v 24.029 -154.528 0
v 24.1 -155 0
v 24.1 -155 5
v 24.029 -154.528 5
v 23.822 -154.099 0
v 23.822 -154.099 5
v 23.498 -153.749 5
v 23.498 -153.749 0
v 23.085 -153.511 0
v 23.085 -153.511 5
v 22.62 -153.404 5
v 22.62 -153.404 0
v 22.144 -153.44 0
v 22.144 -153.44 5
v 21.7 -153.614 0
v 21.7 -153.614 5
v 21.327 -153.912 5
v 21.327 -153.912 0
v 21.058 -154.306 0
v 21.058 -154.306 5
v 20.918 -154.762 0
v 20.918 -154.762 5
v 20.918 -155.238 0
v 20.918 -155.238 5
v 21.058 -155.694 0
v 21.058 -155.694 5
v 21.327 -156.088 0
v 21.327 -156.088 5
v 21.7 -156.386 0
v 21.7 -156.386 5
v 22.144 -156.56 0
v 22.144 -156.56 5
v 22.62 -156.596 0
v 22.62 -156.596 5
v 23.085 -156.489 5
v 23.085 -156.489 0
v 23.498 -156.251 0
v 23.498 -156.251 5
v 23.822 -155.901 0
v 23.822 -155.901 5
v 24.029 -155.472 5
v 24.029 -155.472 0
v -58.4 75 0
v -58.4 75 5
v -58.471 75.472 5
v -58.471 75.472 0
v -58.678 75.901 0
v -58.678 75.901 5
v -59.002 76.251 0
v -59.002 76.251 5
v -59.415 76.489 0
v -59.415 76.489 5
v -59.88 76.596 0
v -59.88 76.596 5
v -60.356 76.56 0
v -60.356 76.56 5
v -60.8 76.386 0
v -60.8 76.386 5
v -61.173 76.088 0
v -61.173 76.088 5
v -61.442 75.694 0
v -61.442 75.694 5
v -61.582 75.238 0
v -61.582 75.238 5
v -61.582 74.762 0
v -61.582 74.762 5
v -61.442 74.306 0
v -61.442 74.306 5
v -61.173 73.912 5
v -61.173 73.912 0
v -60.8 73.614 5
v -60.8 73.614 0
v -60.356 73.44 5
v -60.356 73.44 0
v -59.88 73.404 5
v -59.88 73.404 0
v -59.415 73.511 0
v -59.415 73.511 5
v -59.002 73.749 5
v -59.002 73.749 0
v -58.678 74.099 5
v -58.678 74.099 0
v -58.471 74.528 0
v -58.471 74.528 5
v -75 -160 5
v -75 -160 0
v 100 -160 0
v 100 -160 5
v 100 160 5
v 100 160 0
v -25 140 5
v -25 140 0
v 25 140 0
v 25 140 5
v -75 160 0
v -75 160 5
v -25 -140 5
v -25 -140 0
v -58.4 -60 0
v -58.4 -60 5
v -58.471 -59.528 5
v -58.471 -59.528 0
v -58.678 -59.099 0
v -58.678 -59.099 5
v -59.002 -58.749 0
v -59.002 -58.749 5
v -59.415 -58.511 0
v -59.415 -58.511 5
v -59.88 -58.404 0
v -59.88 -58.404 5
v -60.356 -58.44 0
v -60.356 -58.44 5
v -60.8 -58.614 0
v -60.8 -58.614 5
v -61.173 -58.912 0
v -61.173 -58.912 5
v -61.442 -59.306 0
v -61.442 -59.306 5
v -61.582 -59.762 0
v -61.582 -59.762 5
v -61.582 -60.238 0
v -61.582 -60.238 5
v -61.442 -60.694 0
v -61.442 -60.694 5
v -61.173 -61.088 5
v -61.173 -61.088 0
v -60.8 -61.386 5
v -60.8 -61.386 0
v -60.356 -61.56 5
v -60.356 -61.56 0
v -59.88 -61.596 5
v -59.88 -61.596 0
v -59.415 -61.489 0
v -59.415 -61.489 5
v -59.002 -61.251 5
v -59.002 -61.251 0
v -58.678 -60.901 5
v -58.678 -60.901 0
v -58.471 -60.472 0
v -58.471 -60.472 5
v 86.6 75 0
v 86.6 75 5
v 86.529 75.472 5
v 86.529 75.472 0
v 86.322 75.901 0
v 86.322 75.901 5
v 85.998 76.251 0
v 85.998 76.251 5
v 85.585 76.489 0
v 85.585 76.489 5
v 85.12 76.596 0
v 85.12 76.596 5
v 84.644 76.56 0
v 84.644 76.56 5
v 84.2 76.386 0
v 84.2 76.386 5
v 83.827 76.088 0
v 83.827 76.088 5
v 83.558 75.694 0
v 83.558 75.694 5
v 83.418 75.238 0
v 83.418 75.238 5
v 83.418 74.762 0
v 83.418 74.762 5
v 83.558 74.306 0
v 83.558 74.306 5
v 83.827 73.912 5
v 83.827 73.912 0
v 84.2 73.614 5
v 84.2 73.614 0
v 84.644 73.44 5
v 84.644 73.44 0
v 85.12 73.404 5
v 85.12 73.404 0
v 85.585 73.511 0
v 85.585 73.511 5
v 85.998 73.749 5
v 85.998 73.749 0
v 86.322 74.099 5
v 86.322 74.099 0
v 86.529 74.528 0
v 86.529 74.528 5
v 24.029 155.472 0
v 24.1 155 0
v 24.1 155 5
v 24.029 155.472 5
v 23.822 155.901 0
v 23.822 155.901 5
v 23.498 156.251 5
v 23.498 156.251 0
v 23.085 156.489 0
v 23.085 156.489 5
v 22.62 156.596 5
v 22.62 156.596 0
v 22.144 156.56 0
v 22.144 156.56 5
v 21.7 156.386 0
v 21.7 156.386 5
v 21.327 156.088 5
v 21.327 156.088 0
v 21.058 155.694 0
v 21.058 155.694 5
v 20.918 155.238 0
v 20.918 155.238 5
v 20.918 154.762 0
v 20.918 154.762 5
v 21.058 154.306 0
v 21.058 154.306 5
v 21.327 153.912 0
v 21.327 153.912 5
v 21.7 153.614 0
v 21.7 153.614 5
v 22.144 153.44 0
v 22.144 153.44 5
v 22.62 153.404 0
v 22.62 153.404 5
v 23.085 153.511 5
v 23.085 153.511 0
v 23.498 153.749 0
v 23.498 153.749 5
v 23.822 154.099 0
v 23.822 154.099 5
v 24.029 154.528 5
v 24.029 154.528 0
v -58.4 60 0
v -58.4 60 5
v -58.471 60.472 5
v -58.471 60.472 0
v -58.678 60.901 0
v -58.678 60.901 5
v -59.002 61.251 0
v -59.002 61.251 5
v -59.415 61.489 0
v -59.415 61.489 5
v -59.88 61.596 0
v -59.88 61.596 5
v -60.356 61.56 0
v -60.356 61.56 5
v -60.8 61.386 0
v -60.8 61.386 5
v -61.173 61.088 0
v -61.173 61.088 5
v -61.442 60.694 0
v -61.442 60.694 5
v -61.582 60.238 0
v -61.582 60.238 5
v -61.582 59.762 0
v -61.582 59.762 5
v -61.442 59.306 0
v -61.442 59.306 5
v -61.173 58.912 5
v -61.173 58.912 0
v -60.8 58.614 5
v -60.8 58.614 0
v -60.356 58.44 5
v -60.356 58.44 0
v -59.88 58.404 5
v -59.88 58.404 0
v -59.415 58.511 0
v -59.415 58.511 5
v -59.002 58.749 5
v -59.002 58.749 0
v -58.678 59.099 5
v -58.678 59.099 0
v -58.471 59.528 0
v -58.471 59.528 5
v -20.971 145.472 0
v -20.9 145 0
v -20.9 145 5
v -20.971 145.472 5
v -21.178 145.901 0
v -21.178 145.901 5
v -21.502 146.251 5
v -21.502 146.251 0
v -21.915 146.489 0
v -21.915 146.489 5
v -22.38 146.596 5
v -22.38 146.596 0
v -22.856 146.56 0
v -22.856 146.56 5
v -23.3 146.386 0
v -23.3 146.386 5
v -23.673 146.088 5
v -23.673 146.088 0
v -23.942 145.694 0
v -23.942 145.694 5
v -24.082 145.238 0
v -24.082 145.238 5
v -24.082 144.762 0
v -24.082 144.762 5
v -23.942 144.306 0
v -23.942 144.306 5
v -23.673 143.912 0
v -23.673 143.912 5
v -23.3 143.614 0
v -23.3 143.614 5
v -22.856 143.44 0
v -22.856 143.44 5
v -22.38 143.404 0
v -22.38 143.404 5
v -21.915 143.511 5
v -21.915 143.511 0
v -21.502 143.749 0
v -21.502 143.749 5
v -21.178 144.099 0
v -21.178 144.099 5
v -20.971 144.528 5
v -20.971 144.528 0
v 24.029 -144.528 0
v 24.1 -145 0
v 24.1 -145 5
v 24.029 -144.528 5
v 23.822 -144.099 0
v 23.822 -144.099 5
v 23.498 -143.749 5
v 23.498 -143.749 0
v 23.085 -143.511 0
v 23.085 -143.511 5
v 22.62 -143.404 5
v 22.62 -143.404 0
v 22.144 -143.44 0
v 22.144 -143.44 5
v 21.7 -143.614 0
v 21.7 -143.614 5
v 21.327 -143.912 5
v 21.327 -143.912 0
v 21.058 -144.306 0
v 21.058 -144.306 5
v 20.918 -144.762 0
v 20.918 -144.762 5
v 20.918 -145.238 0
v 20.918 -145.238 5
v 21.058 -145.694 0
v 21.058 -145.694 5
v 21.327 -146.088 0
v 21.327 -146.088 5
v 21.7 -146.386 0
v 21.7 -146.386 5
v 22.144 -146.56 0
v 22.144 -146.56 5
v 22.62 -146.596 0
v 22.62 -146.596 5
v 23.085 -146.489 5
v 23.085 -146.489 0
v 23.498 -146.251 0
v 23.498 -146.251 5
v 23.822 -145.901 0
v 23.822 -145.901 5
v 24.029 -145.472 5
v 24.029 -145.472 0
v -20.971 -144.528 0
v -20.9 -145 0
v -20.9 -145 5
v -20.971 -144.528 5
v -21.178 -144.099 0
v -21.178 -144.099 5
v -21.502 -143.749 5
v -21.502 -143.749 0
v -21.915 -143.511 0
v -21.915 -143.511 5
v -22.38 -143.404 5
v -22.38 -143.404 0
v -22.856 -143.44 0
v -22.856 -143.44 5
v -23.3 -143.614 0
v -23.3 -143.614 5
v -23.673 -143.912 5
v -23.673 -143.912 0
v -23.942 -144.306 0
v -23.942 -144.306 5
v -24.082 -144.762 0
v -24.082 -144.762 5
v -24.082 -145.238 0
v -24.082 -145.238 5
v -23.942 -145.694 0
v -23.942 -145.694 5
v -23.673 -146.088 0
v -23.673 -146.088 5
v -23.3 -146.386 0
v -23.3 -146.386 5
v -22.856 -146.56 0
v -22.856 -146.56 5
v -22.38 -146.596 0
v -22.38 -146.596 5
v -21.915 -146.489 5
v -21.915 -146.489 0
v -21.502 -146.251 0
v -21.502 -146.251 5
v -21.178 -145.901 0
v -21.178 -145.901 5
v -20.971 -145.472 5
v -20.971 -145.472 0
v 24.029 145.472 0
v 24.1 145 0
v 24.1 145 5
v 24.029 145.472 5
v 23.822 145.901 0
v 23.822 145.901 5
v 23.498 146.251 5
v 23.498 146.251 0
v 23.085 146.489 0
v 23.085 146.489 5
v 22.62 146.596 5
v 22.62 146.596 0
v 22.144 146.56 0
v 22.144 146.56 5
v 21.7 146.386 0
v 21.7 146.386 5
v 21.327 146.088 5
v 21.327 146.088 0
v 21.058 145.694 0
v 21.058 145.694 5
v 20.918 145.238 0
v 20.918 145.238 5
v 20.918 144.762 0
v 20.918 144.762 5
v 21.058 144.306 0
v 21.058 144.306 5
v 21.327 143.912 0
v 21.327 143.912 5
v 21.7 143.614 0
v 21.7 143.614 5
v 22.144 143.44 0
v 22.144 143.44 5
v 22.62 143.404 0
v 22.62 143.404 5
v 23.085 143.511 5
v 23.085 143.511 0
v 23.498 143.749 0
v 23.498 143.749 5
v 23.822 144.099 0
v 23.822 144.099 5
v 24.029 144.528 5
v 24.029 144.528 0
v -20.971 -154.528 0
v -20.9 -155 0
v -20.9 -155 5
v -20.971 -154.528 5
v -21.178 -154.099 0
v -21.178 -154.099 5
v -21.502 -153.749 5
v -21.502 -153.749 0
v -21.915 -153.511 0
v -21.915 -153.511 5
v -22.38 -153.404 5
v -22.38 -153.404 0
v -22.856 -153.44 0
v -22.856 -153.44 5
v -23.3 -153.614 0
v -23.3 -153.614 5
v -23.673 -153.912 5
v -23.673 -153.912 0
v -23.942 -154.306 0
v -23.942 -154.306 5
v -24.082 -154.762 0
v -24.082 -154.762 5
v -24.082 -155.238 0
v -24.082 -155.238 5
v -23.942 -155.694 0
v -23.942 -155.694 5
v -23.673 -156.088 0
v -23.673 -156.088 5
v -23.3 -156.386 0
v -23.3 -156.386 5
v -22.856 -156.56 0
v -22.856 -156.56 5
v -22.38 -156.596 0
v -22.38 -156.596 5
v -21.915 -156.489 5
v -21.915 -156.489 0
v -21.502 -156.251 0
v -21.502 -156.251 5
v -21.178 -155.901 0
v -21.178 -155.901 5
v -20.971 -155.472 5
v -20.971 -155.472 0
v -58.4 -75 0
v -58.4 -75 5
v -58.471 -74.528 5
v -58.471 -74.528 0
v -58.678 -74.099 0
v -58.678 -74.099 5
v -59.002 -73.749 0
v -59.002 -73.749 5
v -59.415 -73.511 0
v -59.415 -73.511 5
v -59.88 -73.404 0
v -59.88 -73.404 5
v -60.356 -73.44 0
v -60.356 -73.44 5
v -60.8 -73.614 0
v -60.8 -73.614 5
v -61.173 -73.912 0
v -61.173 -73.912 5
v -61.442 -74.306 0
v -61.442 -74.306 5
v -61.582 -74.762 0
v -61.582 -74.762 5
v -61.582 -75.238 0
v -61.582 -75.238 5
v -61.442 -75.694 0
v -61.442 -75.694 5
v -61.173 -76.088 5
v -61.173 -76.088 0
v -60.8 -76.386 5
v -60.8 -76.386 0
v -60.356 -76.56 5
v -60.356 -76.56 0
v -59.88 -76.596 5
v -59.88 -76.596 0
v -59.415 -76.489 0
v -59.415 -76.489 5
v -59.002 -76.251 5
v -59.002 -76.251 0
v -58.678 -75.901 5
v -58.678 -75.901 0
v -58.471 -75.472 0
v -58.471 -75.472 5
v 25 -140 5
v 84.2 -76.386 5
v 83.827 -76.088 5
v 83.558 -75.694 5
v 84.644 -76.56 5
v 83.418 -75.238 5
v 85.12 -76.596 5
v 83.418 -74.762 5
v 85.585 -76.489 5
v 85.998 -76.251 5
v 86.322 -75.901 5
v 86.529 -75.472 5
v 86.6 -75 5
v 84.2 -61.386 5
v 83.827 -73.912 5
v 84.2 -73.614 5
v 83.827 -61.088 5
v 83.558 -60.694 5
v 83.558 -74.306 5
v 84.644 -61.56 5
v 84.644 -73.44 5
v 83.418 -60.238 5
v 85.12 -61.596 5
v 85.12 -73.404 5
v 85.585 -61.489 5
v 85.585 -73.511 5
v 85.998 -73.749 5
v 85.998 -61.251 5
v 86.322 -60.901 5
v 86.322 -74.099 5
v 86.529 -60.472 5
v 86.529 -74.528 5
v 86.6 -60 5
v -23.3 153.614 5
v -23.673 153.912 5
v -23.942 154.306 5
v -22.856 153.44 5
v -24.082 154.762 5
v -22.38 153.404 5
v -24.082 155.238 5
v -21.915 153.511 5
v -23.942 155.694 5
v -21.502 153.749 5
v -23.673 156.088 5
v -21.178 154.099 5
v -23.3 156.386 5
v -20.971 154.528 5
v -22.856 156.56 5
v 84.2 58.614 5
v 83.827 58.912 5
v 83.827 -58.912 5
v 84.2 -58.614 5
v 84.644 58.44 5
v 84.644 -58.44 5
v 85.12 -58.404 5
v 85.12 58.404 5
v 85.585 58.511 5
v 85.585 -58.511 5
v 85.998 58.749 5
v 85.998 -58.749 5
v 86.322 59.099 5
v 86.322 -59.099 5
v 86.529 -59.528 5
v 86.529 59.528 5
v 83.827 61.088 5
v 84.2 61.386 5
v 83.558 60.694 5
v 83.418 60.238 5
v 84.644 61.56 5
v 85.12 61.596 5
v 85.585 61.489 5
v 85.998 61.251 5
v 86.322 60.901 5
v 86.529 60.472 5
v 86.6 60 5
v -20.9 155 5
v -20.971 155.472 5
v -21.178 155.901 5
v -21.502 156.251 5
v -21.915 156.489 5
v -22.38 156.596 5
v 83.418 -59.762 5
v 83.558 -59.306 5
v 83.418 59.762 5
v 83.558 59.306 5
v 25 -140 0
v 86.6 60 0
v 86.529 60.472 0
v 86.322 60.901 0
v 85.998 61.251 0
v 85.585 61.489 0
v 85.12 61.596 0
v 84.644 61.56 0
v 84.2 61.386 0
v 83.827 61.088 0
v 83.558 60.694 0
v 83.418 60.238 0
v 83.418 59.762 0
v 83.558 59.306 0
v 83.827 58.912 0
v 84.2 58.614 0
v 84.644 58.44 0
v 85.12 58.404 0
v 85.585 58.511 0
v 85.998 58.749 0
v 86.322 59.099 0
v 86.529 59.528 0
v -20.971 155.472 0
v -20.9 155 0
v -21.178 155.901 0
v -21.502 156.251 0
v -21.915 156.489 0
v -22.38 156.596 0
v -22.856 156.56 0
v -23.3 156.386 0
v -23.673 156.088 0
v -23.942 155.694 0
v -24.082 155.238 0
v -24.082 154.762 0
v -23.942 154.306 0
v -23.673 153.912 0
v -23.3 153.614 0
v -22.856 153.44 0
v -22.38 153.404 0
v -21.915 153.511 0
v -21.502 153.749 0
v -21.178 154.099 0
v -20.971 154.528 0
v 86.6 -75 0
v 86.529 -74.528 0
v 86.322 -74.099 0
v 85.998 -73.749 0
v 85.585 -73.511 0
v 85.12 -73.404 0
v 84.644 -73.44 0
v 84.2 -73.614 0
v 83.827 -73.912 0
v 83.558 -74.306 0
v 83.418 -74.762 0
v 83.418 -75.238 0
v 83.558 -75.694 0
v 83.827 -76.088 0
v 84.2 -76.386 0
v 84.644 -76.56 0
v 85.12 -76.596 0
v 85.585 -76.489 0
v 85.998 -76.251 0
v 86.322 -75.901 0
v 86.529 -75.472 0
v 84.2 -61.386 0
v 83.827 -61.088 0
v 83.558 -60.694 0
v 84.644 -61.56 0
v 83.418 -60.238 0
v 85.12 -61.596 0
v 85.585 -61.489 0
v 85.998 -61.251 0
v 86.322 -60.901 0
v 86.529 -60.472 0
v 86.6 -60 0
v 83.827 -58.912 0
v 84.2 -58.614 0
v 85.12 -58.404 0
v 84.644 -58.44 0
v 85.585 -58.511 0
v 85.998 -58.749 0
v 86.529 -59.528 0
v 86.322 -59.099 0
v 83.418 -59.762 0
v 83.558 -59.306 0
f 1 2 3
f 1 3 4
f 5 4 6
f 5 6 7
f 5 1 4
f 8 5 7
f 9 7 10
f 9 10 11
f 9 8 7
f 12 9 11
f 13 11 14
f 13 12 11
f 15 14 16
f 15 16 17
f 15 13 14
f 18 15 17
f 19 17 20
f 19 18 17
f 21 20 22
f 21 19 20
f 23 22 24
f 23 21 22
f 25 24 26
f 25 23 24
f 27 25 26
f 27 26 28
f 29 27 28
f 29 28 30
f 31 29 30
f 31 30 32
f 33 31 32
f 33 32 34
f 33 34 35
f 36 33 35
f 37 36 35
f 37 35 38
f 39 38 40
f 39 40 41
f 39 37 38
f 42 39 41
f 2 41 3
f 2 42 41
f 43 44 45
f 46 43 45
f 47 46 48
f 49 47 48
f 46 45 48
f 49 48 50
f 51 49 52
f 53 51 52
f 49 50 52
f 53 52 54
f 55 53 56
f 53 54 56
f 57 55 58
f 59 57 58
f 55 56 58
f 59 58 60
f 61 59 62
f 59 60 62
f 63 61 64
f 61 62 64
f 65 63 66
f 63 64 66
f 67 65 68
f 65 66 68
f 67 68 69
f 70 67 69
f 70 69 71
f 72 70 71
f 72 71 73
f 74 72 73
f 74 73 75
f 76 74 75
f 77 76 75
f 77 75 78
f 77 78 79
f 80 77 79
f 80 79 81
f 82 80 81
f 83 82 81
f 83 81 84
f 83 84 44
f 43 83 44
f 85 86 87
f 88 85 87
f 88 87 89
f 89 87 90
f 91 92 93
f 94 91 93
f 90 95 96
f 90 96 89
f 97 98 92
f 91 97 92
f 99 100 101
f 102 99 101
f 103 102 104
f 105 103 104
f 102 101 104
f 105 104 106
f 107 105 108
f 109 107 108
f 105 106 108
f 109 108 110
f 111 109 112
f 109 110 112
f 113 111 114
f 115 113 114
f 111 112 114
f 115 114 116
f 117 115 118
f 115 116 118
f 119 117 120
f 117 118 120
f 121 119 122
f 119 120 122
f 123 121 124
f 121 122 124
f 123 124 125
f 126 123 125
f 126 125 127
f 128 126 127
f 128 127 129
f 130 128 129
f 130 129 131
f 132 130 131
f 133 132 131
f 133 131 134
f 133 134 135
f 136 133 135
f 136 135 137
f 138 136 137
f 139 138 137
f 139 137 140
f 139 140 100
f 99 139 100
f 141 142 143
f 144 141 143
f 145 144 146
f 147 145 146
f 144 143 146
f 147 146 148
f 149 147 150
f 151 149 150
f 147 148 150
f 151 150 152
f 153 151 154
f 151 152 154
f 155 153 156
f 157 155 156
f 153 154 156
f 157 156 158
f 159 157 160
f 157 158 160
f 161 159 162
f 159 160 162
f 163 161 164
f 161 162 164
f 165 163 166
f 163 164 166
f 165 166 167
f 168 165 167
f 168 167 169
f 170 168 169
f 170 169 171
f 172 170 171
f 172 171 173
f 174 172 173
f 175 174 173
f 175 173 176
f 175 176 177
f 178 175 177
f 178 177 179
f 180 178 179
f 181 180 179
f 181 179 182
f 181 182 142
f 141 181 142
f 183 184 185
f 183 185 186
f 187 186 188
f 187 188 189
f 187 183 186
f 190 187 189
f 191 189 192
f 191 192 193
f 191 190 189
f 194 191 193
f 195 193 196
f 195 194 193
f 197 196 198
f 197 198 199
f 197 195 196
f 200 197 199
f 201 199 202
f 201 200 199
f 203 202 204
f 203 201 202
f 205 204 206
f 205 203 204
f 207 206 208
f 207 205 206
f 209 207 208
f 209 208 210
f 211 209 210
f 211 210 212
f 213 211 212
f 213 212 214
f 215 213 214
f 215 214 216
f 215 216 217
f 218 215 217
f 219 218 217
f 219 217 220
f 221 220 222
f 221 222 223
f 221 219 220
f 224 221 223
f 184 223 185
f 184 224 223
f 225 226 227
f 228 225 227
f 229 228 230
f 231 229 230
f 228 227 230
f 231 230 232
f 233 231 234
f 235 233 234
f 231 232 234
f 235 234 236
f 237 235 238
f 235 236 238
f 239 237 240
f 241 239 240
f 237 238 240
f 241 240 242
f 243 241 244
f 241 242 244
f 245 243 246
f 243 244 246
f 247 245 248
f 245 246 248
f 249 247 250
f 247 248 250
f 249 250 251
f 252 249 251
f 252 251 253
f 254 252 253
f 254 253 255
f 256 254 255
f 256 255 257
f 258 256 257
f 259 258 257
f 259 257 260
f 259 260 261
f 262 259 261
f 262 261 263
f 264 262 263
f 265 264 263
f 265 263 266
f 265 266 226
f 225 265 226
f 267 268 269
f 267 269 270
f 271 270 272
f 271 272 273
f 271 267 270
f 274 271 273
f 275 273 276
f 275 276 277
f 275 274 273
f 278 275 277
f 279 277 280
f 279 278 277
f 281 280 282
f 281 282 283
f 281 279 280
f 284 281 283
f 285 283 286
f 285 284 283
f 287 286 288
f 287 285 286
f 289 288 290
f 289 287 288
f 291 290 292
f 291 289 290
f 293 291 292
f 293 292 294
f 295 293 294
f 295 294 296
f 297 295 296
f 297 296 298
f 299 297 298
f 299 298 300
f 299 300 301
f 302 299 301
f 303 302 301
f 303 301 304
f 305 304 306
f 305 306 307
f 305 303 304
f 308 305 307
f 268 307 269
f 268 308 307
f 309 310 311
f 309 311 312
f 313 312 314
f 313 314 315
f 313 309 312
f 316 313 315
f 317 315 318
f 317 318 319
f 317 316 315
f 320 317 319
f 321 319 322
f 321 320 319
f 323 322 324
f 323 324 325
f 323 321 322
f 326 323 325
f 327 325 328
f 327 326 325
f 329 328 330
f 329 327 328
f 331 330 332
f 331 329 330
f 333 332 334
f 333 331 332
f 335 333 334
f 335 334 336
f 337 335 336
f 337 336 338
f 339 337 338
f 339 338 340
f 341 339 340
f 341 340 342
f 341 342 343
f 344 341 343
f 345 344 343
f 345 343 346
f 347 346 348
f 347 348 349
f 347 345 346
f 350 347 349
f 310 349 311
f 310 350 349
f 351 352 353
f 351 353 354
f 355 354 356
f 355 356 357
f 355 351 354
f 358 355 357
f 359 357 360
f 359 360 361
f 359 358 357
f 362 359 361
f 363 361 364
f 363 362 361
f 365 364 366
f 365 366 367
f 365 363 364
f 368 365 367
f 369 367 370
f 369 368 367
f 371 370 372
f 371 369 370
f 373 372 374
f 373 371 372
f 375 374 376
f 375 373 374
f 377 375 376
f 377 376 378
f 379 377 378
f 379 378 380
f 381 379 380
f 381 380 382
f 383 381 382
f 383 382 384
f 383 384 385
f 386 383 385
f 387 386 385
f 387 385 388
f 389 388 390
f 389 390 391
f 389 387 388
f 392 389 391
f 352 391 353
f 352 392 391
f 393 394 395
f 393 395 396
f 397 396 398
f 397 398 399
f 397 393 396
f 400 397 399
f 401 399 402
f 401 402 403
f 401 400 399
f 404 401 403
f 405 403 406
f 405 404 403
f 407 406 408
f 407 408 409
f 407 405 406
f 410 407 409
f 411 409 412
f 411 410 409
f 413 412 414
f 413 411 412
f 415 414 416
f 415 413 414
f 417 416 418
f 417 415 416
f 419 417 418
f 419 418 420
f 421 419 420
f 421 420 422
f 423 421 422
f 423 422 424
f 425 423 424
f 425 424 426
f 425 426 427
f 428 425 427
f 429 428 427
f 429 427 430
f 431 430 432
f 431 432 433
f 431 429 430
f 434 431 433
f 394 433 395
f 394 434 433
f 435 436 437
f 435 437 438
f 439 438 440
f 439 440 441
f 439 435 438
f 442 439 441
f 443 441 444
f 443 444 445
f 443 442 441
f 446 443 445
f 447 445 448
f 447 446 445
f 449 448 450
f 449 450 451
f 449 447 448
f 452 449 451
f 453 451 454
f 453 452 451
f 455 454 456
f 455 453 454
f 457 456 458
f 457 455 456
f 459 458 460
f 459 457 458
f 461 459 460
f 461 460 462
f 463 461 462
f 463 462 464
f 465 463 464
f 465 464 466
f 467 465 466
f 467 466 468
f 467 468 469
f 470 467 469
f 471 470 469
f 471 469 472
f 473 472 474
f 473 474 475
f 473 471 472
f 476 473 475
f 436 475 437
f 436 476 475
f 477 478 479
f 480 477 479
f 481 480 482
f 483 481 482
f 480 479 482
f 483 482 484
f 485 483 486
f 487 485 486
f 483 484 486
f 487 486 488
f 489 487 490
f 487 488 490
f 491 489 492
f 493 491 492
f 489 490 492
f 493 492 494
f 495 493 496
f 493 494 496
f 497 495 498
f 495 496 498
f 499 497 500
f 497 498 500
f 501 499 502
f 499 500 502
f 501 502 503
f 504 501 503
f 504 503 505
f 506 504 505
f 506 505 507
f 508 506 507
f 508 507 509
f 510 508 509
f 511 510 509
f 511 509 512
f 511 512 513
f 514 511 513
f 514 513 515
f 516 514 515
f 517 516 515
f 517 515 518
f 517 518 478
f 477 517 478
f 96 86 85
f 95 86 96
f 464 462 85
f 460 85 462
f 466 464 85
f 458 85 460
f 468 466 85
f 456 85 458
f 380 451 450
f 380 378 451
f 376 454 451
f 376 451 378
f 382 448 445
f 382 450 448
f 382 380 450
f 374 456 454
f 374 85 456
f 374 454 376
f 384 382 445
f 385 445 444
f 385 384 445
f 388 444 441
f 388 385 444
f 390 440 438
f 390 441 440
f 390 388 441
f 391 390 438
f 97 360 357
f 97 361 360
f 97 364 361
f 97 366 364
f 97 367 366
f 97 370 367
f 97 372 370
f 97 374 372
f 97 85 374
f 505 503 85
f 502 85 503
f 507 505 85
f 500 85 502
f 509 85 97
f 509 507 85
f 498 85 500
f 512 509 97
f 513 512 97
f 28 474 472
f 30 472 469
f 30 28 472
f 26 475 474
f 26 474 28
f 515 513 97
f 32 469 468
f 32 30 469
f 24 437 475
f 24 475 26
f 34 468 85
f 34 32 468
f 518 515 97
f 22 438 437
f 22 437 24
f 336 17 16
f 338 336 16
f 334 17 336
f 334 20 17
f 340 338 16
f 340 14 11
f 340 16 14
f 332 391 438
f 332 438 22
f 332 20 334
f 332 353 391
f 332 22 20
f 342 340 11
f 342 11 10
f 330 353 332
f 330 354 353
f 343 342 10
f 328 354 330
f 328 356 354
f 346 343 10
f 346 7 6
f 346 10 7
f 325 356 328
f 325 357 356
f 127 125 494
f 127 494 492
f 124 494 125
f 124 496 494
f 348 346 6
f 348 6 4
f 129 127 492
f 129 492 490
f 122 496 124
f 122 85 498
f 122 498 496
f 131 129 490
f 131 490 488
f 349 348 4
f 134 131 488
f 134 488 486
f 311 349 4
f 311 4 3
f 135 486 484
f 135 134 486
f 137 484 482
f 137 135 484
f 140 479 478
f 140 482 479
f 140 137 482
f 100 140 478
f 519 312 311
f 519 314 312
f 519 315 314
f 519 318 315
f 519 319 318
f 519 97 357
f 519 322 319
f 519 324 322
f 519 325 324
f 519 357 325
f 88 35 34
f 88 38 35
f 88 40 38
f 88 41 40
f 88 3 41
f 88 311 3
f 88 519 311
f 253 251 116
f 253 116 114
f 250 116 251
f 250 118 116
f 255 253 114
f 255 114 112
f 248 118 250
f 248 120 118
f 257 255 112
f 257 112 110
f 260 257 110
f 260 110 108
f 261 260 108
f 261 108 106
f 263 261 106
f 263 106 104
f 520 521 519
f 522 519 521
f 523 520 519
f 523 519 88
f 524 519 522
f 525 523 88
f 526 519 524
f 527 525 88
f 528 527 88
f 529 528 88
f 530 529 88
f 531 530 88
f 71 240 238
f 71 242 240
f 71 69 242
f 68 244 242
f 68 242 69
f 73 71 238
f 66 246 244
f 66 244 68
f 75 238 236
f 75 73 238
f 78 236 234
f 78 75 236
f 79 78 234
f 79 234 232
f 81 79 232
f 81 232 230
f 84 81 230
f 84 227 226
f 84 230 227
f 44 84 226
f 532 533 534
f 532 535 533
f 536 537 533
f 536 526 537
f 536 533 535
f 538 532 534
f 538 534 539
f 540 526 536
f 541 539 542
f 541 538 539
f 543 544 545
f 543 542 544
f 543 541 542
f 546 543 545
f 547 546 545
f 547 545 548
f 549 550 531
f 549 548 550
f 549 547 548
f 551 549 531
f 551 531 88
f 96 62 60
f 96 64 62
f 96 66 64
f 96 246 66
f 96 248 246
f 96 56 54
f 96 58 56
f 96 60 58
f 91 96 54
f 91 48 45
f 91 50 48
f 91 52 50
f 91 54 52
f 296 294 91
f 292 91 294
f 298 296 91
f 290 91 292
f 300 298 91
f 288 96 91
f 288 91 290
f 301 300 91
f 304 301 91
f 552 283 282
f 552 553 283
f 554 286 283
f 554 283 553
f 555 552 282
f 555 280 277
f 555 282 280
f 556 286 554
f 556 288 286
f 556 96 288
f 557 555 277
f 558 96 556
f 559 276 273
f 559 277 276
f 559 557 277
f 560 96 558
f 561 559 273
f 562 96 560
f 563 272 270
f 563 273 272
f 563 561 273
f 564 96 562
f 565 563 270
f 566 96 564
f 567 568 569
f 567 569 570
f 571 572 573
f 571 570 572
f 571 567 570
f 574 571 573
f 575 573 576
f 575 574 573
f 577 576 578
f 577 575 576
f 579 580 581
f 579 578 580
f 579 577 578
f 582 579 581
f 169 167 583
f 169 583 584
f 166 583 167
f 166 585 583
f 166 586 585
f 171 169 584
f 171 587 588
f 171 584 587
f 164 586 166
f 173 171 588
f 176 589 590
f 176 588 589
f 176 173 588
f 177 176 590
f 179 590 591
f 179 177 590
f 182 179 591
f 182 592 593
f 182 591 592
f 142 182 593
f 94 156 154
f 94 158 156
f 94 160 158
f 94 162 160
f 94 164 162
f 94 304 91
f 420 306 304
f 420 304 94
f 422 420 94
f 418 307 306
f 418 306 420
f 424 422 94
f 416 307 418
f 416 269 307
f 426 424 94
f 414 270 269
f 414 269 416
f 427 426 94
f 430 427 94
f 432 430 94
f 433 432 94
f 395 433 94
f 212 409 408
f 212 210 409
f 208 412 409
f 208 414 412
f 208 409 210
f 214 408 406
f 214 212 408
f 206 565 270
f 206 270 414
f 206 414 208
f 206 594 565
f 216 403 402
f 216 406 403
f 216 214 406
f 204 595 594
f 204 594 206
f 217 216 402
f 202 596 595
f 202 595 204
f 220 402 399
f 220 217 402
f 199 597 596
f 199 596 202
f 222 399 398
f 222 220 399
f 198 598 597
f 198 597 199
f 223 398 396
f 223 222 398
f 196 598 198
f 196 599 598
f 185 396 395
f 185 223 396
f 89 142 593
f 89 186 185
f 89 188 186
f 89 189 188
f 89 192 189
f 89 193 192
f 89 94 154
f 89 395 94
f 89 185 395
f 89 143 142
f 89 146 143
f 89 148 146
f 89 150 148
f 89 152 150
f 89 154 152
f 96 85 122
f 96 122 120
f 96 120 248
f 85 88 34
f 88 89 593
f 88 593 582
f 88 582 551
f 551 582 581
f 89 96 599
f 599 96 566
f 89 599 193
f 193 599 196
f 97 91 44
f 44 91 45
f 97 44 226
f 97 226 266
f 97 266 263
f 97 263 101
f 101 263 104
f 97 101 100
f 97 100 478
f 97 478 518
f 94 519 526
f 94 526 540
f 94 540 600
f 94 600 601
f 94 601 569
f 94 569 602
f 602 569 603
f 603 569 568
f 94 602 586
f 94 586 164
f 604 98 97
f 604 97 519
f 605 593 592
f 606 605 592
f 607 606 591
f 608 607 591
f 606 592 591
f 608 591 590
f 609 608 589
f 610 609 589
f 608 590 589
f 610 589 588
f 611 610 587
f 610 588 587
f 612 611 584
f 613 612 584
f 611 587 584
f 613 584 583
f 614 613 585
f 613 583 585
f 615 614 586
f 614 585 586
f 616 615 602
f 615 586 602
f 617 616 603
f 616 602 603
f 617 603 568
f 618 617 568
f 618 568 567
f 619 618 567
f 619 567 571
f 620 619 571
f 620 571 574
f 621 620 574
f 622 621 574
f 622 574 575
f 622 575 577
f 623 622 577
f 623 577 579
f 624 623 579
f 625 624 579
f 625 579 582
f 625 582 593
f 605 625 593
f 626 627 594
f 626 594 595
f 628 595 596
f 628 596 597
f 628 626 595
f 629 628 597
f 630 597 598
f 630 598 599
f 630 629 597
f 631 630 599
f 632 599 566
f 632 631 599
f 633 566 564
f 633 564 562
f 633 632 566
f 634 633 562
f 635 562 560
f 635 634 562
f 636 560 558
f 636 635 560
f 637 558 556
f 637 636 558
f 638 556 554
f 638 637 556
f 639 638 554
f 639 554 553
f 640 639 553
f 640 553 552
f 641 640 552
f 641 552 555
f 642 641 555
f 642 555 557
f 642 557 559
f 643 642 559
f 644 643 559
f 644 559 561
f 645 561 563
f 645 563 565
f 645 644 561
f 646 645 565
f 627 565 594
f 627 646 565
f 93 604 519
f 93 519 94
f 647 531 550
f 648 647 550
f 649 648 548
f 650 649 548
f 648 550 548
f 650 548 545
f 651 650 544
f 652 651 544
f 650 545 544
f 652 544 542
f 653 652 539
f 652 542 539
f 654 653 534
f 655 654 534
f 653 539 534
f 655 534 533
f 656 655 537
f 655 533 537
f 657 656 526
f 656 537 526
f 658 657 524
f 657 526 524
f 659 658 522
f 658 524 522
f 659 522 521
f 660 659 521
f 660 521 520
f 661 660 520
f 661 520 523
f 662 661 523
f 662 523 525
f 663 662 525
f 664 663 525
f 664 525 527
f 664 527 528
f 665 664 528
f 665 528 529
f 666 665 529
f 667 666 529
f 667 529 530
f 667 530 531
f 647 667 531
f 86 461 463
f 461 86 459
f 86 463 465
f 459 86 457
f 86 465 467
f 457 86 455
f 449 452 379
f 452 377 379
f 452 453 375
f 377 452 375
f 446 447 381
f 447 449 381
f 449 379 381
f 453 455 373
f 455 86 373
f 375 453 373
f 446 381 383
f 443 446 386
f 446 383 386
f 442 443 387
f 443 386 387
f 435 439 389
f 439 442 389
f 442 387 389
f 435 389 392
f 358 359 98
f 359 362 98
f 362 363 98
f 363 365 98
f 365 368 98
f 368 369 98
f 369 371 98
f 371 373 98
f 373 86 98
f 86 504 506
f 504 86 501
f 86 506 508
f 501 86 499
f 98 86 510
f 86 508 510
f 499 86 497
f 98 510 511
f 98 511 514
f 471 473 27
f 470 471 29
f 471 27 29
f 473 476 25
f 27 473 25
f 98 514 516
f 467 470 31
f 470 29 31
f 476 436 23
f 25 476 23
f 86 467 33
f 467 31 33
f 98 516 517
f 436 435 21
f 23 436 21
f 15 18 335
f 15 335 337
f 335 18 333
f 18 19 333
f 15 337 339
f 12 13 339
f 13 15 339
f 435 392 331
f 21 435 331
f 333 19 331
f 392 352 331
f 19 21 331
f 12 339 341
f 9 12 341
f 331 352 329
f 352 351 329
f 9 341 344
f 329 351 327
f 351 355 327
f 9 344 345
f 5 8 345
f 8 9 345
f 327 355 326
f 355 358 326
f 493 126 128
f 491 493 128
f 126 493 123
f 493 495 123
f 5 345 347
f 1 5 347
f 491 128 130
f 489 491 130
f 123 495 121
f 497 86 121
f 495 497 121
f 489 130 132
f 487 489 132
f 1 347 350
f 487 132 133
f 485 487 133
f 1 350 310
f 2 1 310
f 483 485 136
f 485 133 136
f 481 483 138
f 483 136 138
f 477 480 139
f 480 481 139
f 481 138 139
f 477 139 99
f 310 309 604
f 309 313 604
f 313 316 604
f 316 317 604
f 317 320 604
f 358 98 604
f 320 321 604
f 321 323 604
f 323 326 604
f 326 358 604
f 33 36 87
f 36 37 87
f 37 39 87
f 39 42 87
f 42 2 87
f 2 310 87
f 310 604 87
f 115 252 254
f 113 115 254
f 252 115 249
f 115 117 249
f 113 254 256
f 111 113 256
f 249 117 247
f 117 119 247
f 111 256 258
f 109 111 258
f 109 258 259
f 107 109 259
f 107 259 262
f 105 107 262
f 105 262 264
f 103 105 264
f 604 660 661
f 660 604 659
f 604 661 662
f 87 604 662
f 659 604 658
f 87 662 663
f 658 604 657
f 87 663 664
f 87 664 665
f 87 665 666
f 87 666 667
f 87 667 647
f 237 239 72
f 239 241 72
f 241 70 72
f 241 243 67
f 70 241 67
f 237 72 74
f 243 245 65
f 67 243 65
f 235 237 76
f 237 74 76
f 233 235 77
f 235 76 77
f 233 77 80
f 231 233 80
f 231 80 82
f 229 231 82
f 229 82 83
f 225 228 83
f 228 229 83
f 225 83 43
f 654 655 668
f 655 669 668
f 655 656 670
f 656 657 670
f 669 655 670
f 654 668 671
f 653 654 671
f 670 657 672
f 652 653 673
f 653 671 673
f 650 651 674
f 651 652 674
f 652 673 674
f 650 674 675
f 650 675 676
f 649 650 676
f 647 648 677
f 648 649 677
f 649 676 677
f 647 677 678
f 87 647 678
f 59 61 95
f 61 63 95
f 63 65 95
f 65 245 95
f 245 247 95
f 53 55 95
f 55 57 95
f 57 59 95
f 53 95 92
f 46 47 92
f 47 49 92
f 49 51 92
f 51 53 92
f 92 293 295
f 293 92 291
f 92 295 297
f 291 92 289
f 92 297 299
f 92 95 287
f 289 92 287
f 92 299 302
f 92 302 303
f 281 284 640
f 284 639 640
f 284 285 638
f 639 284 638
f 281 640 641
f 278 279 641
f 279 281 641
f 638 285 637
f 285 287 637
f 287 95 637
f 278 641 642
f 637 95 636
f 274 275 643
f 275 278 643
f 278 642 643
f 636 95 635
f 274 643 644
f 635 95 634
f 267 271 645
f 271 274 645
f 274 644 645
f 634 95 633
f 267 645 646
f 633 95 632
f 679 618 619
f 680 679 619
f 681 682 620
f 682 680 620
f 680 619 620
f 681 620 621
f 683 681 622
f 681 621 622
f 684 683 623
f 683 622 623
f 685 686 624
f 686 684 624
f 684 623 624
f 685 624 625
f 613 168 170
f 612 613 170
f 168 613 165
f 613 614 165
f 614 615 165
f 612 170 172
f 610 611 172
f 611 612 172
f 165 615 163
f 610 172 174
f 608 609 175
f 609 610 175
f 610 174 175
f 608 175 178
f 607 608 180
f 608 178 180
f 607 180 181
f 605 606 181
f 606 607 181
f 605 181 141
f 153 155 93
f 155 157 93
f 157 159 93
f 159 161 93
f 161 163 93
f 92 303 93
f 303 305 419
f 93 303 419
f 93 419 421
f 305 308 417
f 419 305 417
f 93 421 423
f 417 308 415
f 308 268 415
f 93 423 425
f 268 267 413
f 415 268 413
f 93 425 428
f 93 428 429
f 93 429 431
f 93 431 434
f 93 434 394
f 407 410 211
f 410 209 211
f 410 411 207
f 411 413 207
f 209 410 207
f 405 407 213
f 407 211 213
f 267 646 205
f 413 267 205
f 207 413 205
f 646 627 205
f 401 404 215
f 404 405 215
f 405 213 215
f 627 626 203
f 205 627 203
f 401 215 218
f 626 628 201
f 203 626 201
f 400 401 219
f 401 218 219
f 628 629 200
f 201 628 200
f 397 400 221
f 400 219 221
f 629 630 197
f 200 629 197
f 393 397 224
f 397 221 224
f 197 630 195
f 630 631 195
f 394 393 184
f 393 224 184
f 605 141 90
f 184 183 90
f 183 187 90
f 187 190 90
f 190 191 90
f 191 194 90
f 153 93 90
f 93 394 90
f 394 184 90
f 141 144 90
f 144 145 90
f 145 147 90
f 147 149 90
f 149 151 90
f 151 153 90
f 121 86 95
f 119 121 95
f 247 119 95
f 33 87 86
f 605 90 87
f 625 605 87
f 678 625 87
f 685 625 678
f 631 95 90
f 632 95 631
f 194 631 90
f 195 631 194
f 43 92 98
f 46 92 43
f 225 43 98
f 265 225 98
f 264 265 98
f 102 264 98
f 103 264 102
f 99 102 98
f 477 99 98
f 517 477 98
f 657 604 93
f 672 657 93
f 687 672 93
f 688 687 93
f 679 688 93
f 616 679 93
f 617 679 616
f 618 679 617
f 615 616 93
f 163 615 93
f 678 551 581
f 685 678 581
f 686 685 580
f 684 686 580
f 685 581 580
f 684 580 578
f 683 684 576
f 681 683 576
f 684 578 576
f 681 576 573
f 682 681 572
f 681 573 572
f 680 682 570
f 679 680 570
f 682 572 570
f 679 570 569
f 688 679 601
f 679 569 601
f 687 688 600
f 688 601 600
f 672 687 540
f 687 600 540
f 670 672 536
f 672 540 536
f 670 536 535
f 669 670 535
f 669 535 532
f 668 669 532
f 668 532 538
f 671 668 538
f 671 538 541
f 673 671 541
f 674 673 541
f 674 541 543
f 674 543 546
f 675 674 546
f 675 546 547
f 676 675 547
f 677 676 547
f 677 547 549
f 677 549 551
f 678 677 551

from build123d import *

# Parameters (mm, degrees)
SKETCH1_W           = 100
SKETCH1_H           = 320
SKETCH1_R           = 1.6
SKETCH1_W_2         = 50
SKETCH1_H_2         = 280
BOSS_EXTRUDE1_DEPTH = 5
SKETCH2_W           = 50
SKETCH2_H           = 320
BOSS_EXTRUDE2_DEPTH = 5
SKETCH3_W           = 25
SKETCH3_H           = 320
BOSS_EXTRUDE3_DEPTH = 5
CUT_EXTRUDE1_REACH  = 7
SKETCH4_R           = 1.6


with BuildPart() as part:
    # Sketch1 → Boss-Extrude1 (new body)
    with BuildSketch(Plane.XY):
        Rectangle(SKETCH1_W, SKETCH1_H)
        with Locations((-22.5, 145)):
            Circle(SKETCH1_R, mode=Mode.SUBTRACT)
        with Locations((-22.5, 155)):
            Circle(SKETCH1_R, mode=Mode.SUBTRACT)
        with Locations((22.5, 145)):
            Circle(SKETCH1_R, mode=Mode.SUBTRACT)
        with Locations((22.5, -145)):
            Circle(SKETCH1_R, mode=Mode.SUBTRACT)
        with Locations((-22.5, -145)):
            Circle(SKETCH1_R, mode=Mode.SUBTRACT)
        with Locations((22.5, 155)):
            Circle(SKETCH1_R, mode=Mode.SUBTRACT)
        with Locations((22.5, -155)):
            Circle(SKETCH1_R, mode=Mode.SUBTRACT)
        with Locations((-22.5, -155)):
            Circle(SKETCH1_R, mode=Mode.SUBTRACT)
        Rectangle(SKETCH1_W_2, SKETCH1_H_2, mode=Mode.SUBTRACT)
    extrude(amount=BOSS_EXTRUDE1_DEPTH)

    # Sketch2 → Boss-Extrude2 (add)
    with BuildSketch(Plane.XY):
        with Locations((75, 0)):
            Rectangle(SKETCH2_W, SKETCH2_H)
    extrude(amount=BOSS_EXTRUDE2_DEPTH)

    # Sketch3 → Boss-Extrude3 (add)
    with BuildSketch(Plane.XY):
        with Locations((-62.5, 0)):
            Rectangle(SKETCH3_W, SKETCH3_H)
    extrude(amount=BOSS_EXTRUDE3_DEPTH)

    # Sketch4 → Cut-Extrude1 (cut, up to next)
    with BuildSketch(Plane.XY.offset(5), mode=Mode.PRIVATE) as cut_extrude1_sk1:
        with Locations((-60, 75)):
            Circle(SKETCH4_R)
    cut_extrude1_tool1 = extrude(cut_extrude1_sk1.sketch, amount=-CUT_EXTRUDE1_REACH, mode=Mode.PRIVATE) & part.part
    add(cut_extrude1_tool1.solids().sort_by_distance((-60, 75, 5))[0], mode=Mode.SUBTRACT)
    # Sketch4 → Cut-Extrude1 (cut, up to next)
    with BuildSketch(Plane.XY.offset(5), mode=Mode.PRIVATE) as cut_extrude1_sk2:
        with Locations((-60, 60)):
            Circle(SKETCH4_R)
    cut_extrude1_tool2 = extrude(cut_extrude1_sk2.sketch, amount=-CUT_EXTRUDE1_REACH, mode=Mode.PRIVATE) & part.part
    add(cut_extrude1_tool2.solids().sort_by_distance((-60, 60, 5))[0], mode=Mode.SUBTRACT)
    # Sketch4 → Cut-Extrude1 (cut, up to next)
    with BuildSketch(Plane.XY.offset(5), mode=Mode.PRIVATE) as cut_extrude1_sk3:
        with Locations((-60, -60)):
            Circle(SKETCH4_R)
    cut_extrude1_tool3 = extrude(cut_extrude1_sk3.sketch, amount=-CUT_EXTRUDE1_REACH, mode=Mode.PRIVATE) & part.part
    add(cut_extrude1_tool3.solids().sort_by_distance((-60, -60, 5))[0], mode=Mode.SUBTRACT)
    # Sketch4 → Cut-Extrude1 (cut, up to next)
    with BuildSketch(Plane.XY.offset(5), mode=Mode.PRIVATE) as cut_extrude1_sk4:
        with Locations((-60, -75)):
            Circle(SKETCH4_R)
    cut_extrude1_tool4 = extrude(cut_extrude1_sk4.sketch, amount=-CUT_EXTRUDE1_REACH, mode=Mode.PRIVATE) & part.part
    add(cut_extrude1_tool4.solids().sort_by_distance((-60, -75, 5))[0], mode=Mode.SUBTRACT)
    # Sketch4 → Cut-Extrude1 (cut, up to next)
    with BuildSketch(Plane.XY.offset(5), mode=Mode.PRIVATE) as cut_extrude1_sk5:
        with Locations((85, -75)):
            Circle(SKETCH4_R)
    cut_extrude1_tool5 = extrude(cut_extrude1_sk5.sketch, amount=-CUT_EXTRUDE1_REACH, mode=Mode.PRIVATE) & part.part
    add(cut_extrude1_tool5.solids().sort_by_distance((85, -75, 5))[0], mode=Mode.SUBTRACT)
    # Sketch4 → Cut-Extrude1 (cut, up to next)
    with BuildSketch(Plane.XY.offset(5), mode=Mode.PRIVATE) as cut_extrude1_sk6:
        with Locations((85, -60)):
            Circle(SKETCH4_R)
    cut_extrude1_tool6 = extrude(cut_extrude1_sk6.sketch, amount=-CUT_EXTRUDE1_REACH, mode=Mode.PRIVATE) & part.part
    add(cut_extrude1_tool6.solids().sort_by_distance((85, -60, 5))[0], mode=Mode.SUBTRACT)
    # Sketch4 → Cut-Extrude1 (cut, up to next)
    with BuildSketch(Plane.XY.offset(5), mode=Mode.PRIVATE) as cut_extrude1_sk7:
        with Locations((85, 60)):
            Circle(SKETCH4_R)
    cut_extrude1_tool7 = extrude(cut_extrude1_sk7.sketch, amount=-CUT_EXTRUDE1_REACH, mode=Mode.PRIVATE) & part.part
    add(cut_extrude1_tool7.solids().sort_by_distance((85, 60, 5))[0], mode=Mode.SUBTRACT)
    # Sketch4 → Cut-Extrude1 (cut, up to next)
    with BuildSketch(Plane.XY.offset(5), mode=Mode.PRIVATE) as cut_extrude1_sk8:
        with Locations((85, 75)):
            Circle(SKETCH4_R)
    cut_extrude1_tool8 = extrude(cut_extrude1_sk8.sketch, amount=-CUT_EXTRUDE1_REACH, mode=Mode.PRIVATE) & part.part
    add(cut_extrude1_tool8.solids().sort_by_distance((85, 75, 5))[0], mode=Mode.SUBTRACT)


solid = part.part
